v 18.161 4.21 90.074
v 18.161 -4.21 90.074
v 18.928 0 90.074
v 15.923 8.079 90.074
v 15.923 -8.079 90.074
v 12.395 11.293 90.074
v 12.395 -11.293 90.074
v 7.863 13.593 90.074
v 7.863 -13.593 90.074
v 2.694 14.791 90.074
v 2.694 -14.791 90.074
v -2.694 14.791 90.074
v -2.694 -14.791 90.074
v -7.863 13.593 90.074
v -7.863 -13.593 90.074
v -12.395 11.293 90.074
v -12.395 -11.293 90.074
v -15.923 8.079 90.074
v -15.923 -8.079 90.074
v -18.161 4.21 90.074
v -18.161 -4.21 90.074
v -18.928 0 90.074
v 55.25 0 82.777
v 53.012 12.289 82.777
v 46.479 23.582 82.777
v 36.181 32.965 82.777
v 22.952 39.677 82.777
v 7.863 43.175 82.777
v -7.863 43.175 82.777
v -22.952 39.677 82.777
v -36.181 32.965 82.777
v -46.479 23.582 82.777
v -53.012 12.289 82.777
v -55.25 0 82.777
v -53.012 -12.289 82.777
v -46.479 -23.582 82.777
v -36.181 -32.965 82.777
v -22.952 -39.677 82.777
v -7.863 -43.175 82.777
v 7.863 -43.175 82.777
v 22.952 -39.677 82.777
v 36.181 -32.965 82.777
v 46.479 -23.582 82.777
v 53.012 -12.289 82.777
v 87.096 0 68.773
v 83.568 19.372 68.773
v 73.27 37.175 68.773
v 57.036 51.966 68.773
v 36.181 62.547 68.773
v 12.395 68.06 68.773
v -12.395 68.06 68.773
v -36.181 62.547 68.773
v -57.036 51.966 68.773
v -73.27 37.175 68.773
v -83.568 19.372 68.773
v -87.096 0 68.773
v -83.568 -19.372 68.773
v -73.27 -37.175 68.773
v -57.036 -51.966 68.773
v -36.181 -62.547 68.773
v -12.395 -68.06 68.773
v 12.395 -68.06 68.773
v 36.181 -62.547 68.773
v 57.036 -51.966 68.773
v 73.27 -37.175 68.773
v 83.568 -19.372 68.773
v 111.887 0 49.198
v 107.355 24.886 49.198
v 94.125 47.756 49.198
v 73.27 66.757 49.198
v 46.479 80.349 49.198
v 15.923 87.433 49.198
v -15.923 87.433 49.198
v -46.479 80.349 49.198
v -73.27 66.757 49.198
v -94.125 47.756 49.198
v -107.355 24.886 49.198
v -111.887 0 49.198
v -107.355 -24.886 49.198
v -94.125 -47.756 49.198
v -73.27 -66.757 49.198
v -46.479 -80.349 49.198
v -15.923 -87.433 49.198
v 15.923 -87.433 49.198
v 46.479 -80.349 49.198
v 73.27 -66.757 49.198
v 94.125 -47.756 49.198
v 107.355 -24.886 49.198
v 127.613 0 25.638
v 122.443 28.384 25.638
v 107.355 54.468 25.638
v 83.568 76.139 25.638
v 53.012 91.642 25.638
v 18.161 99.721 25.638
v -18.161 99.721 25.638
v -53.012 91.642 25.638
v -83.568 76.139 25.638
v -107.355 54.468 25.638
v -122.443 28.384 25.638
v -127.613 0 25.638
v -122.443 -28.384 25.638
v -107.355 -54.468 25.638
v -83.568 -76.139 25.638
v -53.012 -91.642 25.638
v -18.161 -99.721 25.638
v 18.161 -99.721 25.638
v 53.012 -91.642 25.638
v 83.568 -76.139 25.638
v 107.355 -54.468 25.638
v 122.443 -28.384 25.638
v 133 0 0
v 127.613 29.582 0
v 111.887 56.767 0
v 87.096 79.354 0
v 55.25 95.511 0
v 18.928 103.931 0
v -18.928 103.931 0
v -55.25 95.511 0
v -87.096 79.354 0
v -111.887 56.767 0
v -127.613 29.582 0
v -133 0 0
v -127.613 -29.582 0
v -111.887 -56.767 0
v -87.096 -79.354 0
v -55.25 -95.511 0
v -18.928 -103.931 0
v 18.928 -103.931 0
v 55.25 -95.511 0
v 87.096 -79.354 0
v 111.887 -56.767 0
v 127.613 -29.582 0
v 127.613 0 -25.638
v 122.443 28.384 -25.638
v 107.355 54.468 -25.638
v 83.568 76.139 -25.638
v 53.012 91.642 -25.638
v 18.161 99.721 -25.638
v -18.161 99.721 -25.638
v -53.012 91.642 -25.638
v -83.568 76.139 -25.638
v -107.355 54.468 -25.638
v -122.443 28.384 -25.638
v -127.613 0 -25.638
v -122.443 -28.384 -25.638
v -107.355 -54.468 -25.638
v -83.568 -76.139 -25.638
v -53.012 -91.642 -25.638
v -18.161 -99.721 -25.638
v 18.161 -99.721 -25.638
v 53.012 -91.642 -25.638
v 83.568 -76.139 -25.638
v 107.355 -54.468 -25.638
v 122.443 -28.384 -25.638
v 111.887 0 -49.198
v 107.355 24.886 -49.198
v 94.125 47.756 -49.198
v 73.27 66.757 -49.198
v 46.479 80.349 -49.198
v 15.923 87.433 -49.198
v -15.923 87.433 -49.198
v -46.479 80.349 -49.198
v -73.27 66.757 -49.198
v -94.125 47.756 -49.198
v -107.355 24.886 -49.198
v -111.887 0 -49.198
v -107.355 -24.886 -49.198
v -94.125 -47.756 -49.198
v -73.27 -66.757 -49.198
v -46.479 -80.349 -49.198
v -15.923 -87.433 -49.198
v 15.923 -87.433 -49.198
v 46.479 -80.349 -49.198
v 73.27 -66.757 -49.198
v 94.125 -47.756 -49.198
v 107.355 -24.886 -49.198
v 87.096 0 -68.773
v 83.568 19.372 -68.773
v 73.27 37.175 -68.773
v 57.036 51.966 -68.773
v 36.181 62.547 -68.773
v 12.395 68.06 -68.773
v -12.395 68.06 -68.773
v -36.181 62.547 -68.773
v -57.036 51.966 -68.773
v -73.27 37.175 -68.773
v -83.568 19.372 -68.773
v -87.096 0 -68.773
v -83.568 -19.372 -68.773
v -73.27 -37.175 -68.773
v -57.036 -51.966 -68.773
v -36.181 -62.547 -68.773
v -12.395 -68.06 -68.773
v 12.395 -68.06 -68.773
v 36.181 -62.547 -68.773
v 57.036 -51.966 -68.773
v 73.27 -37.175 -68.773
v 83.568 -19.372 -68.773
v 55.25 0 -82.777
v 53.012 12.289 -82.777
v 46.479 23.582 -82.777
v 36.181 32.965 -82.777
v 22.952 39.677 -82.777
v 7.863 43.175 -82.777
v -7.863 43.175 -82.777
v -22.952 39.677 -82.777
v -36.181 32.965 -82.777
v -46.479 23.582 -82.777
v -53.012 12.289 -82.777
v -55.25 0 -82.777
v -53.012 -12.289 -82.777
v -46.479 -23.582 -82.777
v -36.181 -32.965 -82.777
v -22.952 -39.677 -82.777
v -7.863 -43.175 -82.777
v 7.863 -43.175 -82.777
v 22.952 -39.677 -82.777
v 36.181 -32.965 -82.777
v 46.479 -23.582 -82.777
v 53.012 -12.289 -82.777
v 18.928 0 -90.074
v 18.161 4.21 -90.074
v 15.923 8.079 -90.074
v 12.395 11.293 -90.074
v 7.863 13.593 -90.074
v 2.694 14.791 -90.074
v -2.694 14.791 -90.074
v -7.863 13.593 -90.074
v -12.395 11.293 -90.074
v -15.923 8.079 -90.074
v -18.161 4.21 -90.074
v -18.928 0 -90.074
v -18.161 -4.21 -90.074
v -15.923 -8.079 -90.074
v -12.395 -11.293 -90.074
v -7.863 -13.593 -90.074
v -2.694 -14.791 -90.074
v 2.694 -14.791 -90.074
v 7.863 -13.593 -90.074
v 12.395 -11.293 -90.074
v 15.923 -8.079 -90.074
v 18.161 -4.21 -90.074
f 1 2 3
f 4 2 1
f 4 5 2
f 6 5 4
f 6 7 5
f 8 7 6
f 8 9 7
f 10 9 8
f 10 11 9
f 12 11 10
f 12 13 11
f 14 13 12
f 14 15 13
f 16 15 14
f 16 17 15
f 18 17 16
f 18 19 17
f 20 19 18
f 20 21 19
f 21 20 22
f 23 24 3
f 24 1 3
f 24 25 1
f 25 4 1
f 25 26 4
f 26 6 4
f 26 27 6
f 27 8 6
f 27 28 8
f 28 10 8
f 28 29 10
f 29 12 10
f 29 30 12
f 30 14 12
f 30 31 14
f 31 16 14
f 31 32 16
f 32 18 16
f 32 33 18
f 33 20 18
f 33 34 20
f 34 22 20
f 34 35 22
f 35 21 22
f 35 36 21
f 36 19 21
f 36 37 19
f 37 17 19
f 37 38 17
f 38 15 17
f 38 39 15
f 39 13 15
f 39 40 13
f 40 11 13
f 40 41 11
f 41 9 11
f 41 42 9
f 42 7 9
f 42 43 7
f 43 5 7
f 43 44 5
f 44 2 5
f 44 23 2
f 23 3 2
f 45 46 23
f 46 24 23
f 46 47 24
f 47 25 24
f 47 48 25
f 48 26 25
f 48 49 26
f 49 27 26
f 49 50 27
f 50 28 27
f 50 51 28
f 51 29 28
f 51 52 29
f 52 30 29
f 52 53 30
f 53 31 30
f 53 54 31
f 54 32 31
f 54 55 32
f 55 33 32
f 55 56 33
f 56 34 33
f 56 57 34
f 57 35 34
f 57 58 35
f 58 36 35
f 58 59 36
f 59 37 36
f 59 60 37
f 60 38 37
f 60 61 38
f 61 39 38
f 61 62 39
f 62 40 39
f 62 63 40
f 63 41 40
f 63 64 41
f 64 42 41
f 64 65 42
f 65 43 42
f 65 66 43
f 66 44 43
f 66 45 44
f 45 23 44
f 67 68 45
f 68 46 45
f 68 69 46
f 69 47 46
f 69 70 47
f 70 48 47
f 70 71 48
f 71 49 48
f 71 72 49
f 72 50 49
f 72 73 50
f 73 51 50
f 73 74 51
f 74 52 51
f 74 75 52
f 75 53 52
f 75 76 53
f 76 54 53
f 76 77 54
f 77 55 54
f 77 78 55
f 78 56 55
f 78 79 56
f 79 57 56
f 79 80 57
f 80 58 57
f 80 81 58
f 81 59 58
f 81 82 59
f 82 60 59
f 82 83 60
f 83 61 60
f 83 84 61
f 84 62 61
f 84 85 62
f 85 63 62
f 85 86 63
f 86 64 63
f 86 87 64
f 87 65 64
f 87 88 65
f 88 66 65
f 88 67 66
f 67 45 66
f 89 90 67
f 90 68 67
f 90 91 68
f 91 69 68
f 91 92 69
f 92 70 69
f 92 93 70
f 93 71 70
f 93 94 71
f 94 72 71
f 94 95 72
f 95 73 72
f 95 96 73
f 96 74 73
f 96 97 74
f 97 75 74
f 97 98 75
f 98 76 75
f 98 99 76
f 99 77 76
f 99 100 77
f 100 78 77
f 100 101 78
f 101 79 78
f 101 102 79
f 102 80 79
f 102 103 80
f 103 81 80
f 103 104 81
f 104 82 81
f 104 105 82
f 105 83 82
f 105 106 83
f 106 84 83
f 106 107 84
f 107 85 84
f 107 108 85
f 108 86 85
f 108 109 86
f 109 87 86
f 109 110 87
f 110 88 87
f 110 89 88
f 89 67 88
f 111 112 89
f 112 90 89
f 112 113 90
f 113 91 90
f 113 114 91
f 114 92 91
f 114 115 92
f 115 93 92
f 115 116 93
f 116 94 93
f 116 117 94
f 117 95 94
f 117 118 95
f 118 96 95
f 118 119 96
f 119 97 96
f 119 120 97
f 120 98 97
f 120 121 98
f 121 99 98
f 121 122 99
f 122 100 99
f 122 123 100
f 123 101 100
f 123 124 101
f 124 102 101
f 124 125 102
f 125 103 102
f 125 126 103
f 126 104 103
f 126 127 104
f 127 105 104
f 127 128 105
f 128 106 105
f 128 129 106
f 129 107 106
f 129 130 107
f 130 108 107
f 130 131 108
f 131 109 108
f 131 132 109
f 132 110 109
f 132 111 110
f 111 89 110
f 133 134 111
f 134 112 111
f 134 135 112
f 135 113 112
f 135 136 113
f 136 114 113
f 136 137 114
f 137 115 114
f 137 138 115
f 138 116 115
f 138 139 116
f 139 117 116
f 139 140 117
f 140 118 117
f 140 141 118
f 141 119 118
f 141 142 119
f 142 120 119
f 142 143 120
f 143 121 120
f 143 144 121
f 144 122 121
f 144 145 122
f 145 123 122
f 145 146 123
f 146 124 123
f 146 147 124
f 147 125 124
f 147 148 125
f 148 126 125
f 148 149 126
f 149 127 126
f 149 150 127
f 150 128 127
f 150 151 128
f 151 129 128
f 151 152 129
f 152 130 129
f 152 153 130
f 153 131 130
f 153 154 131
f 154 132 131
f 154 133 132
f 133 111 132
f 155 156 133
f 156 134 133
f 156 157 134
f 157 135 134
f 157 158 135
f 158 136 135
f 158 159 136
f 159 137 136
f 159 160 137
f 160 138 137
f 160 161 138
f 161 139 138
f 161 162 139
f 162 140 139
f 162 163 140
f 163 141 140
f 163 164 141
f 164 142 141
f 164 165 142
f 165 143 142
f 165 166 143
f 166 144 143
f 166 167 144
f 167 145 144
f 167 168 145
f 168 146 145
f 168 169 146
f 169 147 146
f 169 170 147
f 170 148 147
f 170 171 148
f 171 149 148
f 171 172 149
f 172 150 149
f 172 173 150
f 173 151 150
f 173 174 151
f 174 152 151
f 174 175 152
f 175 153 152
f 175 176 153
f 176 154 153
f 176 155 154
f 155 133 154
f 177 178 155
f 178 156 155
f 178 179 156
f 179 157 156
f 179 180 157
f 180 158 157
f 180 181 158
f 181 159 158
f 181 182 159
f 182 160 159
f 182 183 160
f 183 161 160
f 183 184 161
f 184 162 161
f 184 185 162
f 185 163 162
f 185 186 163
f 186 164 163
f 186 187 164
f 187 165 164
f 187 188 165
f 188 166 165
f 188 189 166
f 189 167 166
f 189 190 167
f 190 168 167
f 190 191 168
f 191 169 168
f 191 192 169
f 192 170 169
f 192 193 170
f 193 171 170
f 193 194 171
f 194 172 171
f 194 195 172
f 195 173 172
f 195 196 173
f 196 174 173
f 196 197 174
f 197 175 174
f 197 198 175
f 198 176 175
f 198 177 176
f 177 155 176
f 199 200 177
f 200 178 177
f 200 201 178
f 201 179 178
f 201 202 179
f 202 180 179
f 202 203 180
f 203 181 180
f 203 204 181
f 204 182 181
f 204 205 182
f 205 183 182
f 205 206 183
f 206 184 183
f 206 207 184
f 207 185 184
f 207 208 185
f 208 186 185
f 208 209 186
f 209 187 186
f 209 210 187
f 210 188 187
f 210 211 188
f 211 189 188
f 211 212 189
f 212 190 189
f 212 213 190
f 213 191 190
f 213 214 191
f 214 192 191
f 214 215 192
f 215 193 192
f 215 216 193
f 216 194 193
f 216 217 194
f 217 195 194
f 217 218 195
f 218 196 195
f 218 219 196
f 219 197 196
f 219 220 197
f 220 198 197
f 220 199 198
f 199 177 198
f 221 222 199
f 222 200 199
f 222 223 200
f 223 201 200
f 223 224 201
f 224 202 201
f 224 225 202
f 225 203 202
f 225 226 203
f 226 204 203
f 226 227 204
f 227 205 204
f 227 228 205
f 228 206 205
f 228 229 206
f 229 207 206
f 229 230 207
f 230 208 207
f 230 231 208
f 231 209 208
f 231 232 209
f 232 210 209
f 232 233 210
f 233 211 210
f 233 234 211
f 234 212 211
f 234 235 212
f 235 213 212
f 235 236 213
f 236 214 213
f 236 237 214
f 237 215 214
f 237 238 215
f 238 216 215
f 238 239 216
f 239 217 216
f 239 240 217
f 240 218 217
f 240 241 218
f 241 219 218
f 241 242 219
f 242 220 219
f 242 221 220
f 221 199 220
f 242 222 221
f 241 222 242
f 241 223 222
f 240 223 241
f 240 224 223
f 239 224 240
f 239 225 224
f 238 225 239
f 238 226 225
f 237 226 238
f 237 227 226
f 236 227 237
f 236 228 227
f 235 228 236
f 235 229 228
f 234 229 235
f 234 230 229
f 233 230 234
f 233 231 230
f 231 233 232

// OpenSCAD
// Generated by SolidPython 1.0.1 on 2020-07-29 00:46:54


scale(v = [19, 15, 13]) {
	sphere(r = 7);
}
/***********************************************
*********      SolidPython code:      **********
************************************************
 
# import packages: SolidPython
from solid import *
from solid.utils import *
from itertools import chain, combinations, permutations


class Resize:

    def __init__(self, scad_file):
        self.scad_file = scad_file
        #self.scad_file = import_scad(scad_file)
        # cone/cylinder param:
        self.r1 = 0
        self.r2 = 0
        self.h = 0
        # rectangular prism param:
        self.w = 0
        self.l = 0
        # ellipse param:
        self.r = 0

    # import OpenScad code (file name corresponds to shape)


    # classify shape + parameters
    def assign(self, param1, param2, param3):
        if self.scad_file == 'cone.scad':
            self.r1 = param1
            self.r2 = param2
            self.h = param3
        elif self.scad_file == 'cylinder.scad':
            self.r1 = param1
            self.r2 = param2
            self.h = param3
        elif self.scad_file == 'rectangularPrism.scad':
            self.h = param1
            self.l = param2
            self.w = param3
        else:
            self.r = param1
            self.h = param2

    # resize parameters
    def iterate(self):
        x = range(3, 20, 2)
        i = 1
        if self.scad_file == 'cone.scad':
            tempList = list(permutations(x, 2))
            for temp in tempList:
                param1 = temp[0]
                param2 = temp[1]
                filepath = 'produced_scad_files/' + 'cone' + str(param1) + '_' + str(param2) + '_' + '.scad'
                scad_render_to_file(cylinder(h=param1, r1=param2, r2=0), filepath)

        elif self.scad_file == 'cylinder.scad':
            tempList = list(permutations(x, 3))
            for temp in tempList:
                param1 = temp[0]
                param2 = temp[1]
                filepath = 'produced_scad_files/' + 'cylinder' + str(param1) + '_' + str(param2) + '_' + '.scad'
                scad_render_to_file(cylinder(h=param1, r1=param2, r2=param2), filepath)

        elif self.scad_file == 'rectangularPrism.scad':
            tempList = list(permutations(x, 3))
            for temp in tempList:
                param1 = temp[0]
                param2 = temp[1]
                param3 = temp[2]
                filepath = 'produced_scad_files/' + 'rectangularPrism' + str(param1) + '_' + str(param2) + '_' + str(
                    param3) + '.scad'
                scad_render_to_file(cube(size=(param1, param2, param3)), filepath)

        elif self.scad_file == 'ellipse.scad':
            tempList = list(permutations(x, 4))
            for temp in tempList:
                param1 = temp[0]
                param2 = temp[1]
                param3 = temp[2]
                param4 = temp[3]
                filepath = 'produced_scad_files/' + 'ellipse' + str(param1) + '_' + str(param2) + '_' + str(param3) + '_' + str(param4) + '.scad'
                scad_render_to_file(scale([param1, param2, param3])(sphere(r=param4)), filepath)

    def render_to_scadfile(self):
        scad_render_to_file(scad, 'example.scad') 
 
************************************************/
